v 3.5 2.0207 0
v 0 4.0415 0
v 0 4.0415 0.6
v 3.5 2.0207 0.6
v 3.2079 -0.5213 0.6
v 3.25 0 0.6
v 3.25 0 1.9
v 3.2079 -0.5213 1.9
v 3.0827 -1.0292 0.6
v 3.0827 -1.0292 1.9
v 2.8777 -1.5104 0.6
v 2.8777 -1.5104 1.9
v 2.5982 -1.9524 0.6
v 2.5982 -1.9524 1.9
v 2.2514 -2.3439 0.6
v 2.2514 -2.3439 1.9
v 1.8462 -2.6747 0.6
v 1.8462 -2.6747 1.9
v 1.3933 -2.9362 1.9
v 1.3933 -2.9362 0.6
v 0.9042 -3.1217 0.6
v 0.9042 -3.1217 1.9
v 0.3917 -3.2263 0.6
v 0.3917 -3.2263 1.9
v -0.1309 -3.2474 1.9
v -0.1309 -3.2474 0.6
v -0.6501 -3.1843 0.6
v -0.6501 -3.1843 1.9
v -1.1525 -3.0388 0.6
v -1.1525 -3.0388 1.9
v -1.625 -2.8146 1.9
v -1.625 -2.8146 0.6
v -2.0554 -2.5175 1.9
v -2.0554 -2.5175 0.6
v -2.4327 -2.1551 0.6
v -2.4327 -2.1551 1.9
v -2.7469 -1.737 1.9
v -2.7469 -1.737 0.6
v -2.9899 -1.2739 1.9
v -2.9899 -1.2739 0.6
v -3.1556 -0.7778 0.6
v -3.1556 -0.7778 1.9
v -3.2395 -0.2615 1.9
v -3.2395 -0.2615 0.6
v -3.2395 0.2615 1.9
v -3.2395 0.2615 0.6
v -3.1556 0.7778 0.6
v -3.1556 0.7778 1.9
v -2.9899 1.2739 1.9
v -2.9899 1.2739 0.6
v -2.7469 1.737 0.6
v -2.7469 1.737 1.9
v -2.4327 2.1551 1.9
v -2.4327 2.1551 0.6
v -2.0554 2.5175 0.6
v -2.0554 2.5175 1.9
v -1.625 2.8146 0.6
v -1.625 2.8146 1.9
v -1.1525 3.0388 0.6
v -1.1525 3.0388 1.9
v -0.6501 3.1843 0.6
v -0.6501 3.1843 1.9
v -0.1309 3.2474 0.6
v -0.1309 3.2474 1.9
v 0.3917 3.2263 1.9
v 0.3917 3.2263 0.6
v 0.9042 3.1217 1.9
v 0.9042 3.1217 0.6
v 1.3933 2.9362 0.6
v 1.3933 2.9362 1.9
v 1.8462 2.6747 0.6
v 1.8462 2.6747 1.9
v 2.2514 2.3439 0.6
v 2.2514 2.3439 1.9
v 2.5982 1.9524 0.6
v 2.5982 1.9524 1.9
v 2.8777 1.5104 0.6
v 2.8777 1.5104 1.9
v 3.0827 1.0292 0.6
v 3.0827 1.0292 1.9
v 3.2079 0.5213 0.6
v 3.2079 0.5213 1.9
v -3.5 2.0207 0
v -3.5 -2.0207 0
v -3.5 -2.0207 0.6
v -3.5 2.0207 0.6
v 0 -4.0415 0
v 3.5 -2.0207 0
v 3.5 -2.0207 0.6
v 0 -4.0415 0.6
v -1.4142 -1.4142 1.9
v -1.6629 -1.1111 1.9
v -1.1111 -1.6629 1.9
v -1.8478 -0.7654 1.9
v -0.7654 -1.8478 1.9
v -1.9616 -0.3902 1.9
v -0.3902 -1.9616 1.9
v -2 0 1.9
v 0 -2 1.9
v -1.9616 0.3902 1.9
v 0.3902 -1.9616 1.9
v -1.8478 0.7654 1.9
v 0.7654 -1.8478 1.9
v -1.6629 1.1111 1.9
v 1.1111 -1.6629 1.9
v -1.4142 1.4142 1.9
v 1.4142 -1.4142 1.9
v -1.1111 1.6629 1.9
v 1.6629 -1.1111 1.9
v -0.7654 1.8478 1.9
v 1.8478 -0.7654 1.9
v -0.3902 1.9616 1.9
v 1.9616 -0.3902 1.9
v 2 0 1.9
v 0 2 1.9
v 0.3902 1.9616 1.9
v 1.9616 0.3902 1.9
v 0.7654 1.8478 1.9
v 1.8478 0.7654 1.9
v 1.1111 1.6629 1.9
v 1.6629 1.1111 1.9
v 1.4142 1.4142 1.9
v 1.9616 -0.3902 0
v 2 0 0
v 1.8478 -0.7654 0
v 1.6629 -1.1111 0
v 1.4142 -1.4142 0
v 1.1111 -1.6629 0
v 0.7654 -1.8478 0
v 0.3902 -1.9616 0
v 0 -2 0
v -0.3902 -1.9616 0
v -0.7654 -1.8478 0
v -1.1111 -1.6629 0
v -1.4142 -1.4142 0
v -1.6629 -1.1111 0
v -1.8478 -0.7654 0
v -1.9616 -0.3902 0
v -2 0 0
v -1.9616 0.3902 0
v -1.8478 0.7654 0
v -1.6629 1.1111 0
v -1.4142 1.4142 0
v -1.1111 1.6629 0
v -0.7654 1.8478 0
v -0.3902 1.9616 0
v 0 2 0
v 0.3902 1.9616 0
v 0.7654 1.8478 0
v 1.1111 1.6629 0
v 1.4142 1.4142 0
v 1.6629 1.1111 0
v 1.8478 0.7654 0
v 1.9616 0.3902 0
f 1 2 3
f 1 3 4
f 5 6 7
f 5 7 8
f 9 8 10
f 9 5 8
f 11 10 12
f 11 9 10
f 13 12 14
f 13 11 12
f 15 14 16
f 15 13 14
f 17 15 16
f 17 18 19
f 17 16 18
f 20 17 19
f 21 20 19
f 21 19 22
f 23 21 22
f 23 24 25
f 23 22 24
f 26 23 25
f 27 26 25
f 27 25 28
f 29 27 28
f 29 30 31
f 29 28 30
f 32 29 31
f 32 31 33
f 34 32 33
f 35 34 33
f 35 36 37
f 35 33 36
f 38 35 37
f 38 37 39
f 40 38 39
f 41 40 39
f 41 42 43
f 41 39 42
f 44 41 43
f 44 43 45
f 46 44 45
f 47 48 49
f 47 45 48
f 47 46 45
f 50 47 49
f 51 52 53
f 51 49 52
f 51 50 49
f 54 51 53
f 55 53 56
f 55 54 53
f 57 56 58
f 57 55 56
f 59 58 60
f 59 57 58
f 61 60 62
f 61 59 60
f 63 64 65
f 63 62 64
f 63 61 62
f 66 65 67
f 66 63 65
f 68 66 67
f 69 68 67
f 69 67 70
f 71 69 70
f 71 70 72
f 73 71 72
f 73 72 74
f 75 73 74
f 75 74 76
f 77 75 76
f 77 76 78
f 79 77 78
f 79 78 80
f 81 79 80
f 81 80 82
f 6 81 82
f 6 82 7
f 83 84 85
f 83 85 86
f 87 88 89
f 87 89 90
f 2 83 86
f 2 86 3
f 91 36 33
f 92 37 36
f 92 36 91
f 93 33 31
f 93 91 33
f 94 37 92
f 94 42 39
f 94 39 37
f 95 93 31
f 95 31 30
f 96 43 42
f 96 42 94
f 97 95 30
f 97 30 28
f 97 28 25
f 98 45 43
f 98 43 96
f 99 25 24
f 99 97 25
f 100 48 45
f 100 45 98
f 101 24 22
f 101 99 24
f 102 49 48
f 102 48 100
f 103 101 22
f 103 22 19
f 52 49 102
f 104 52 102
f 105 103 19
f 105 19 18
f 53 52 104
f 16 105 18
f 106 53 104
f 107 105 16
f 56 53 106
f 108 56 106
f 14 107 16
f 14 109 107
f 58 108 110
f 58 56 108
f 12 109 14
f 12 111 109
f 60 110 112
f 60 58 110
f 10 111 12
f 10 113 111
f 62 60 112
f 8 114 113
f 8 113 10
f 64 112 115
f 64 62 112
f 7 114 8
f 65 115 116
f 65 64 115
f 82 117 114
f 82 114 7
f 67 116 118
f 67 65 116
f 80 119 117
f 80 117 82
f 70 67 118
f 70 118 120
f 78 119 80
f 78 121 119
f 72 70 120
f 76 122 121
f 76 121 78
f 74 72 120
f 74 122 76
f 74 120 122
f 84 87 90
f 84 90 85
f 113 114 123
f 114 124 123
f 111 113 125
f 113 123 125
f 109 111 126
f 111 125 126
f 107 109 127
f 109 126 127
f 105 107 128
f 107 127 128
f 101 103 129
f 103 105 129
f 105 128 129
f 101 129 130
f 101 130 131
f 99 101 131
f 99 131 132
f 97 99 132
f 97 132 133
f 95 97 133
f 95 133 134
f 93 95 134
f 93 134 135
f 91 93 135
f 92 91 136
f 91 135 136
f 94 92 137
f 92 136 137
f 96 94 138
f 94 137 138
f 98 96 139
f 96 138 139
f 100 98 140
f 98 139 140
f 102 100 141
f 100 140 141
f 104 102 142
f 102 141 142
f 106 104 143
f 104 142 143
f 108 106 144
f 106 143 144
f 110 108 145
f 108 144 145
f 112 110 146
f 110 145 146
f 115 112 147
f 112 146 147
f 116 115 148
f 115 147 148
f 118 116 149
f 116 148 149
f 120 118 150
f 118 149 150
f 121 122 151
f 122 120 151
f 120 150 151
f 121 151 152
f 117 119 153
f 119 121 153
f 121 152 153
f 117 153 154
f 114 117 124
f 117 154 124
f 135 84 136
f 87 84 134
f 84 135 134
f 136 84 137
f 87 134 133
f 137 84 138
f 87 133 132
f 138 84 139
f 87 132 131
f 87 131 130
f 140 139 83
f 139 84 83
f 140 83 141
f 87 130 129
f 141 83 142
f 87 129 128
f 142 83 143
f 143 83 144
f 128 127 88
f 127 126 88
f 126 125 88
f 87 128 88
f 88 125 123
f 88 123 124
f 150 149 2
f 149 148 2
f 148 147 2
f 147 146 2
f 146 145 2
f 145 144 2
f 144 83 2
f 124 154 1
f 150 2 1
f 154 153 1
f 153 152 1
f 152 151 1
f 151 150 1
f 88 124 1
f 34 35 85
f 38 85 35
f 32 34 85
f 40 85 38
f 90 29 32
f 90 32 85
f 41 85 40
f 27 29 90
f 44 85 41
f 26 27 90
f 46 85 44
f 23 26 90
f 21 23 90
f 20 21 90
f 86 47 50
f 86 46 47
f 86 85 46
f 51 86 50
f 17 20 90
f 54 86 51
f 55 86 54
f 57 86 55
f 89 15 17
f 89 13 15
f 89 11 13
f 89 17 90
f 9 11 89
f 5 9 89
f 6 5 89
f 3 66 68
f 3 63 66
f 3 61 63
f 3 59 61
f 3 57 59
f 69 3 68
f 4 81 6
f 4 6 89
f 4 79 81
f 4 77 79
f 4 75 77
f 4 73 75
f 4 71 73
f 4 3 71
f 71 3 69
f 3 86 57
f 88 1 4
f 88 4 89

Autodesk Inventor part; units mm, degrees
ref_plane "YZ Plane" through (0, 0, 0) normal (1, 0, 0) x (0, 1, 0)
ref_plane "XZ Plane" through (0, 0, 0) normal (0, 1, 0) x (-1, 0, 0)
ref_plane "XY Plane" through (0, 0, 0) normal (0, 0, 1) x (1, 0, 0)
sketch "スケッチ1" plane through (0, 0, 0) normal (0, 0, 1) x (1, 0, 0)
  circle A0 centre (0, 0) radius 3.25
  circle A1 centre (0, 0) radius 2
  line L0 (0, -4.0415) -> (-3.5, -2.0207)
  line L1 (-3.5, -2.0207) -> (-3.5, 2.0207)
  line L2 (-3.5, 2.0207) -> (0, 4.0415)
  line L3 (0, 4.0415) -> (3.5, 2.0207)
  line L4 (3.5, 2.0207) -> (3.5, -2.0207)
  line L5 (3.5, -2.0207) -> (0, -4.0415)
  dimension "d0" = 6.5
  dimension "d1" = 4
  dimension "d2" = 7
extrude "押し出し1" add sketch "スケッチ1" along normal blind 1.9 contours A0
extrude "押し出し2" add sketch "スケッチ1" along normal blind 0.6 contours L0 L1 L2 L3 L4 L5
thread "ねじ1" size "M4x0.7" class "6H" standard "ANSI Metric M Profile" full length
properties part number "SF419" material "チタン"
